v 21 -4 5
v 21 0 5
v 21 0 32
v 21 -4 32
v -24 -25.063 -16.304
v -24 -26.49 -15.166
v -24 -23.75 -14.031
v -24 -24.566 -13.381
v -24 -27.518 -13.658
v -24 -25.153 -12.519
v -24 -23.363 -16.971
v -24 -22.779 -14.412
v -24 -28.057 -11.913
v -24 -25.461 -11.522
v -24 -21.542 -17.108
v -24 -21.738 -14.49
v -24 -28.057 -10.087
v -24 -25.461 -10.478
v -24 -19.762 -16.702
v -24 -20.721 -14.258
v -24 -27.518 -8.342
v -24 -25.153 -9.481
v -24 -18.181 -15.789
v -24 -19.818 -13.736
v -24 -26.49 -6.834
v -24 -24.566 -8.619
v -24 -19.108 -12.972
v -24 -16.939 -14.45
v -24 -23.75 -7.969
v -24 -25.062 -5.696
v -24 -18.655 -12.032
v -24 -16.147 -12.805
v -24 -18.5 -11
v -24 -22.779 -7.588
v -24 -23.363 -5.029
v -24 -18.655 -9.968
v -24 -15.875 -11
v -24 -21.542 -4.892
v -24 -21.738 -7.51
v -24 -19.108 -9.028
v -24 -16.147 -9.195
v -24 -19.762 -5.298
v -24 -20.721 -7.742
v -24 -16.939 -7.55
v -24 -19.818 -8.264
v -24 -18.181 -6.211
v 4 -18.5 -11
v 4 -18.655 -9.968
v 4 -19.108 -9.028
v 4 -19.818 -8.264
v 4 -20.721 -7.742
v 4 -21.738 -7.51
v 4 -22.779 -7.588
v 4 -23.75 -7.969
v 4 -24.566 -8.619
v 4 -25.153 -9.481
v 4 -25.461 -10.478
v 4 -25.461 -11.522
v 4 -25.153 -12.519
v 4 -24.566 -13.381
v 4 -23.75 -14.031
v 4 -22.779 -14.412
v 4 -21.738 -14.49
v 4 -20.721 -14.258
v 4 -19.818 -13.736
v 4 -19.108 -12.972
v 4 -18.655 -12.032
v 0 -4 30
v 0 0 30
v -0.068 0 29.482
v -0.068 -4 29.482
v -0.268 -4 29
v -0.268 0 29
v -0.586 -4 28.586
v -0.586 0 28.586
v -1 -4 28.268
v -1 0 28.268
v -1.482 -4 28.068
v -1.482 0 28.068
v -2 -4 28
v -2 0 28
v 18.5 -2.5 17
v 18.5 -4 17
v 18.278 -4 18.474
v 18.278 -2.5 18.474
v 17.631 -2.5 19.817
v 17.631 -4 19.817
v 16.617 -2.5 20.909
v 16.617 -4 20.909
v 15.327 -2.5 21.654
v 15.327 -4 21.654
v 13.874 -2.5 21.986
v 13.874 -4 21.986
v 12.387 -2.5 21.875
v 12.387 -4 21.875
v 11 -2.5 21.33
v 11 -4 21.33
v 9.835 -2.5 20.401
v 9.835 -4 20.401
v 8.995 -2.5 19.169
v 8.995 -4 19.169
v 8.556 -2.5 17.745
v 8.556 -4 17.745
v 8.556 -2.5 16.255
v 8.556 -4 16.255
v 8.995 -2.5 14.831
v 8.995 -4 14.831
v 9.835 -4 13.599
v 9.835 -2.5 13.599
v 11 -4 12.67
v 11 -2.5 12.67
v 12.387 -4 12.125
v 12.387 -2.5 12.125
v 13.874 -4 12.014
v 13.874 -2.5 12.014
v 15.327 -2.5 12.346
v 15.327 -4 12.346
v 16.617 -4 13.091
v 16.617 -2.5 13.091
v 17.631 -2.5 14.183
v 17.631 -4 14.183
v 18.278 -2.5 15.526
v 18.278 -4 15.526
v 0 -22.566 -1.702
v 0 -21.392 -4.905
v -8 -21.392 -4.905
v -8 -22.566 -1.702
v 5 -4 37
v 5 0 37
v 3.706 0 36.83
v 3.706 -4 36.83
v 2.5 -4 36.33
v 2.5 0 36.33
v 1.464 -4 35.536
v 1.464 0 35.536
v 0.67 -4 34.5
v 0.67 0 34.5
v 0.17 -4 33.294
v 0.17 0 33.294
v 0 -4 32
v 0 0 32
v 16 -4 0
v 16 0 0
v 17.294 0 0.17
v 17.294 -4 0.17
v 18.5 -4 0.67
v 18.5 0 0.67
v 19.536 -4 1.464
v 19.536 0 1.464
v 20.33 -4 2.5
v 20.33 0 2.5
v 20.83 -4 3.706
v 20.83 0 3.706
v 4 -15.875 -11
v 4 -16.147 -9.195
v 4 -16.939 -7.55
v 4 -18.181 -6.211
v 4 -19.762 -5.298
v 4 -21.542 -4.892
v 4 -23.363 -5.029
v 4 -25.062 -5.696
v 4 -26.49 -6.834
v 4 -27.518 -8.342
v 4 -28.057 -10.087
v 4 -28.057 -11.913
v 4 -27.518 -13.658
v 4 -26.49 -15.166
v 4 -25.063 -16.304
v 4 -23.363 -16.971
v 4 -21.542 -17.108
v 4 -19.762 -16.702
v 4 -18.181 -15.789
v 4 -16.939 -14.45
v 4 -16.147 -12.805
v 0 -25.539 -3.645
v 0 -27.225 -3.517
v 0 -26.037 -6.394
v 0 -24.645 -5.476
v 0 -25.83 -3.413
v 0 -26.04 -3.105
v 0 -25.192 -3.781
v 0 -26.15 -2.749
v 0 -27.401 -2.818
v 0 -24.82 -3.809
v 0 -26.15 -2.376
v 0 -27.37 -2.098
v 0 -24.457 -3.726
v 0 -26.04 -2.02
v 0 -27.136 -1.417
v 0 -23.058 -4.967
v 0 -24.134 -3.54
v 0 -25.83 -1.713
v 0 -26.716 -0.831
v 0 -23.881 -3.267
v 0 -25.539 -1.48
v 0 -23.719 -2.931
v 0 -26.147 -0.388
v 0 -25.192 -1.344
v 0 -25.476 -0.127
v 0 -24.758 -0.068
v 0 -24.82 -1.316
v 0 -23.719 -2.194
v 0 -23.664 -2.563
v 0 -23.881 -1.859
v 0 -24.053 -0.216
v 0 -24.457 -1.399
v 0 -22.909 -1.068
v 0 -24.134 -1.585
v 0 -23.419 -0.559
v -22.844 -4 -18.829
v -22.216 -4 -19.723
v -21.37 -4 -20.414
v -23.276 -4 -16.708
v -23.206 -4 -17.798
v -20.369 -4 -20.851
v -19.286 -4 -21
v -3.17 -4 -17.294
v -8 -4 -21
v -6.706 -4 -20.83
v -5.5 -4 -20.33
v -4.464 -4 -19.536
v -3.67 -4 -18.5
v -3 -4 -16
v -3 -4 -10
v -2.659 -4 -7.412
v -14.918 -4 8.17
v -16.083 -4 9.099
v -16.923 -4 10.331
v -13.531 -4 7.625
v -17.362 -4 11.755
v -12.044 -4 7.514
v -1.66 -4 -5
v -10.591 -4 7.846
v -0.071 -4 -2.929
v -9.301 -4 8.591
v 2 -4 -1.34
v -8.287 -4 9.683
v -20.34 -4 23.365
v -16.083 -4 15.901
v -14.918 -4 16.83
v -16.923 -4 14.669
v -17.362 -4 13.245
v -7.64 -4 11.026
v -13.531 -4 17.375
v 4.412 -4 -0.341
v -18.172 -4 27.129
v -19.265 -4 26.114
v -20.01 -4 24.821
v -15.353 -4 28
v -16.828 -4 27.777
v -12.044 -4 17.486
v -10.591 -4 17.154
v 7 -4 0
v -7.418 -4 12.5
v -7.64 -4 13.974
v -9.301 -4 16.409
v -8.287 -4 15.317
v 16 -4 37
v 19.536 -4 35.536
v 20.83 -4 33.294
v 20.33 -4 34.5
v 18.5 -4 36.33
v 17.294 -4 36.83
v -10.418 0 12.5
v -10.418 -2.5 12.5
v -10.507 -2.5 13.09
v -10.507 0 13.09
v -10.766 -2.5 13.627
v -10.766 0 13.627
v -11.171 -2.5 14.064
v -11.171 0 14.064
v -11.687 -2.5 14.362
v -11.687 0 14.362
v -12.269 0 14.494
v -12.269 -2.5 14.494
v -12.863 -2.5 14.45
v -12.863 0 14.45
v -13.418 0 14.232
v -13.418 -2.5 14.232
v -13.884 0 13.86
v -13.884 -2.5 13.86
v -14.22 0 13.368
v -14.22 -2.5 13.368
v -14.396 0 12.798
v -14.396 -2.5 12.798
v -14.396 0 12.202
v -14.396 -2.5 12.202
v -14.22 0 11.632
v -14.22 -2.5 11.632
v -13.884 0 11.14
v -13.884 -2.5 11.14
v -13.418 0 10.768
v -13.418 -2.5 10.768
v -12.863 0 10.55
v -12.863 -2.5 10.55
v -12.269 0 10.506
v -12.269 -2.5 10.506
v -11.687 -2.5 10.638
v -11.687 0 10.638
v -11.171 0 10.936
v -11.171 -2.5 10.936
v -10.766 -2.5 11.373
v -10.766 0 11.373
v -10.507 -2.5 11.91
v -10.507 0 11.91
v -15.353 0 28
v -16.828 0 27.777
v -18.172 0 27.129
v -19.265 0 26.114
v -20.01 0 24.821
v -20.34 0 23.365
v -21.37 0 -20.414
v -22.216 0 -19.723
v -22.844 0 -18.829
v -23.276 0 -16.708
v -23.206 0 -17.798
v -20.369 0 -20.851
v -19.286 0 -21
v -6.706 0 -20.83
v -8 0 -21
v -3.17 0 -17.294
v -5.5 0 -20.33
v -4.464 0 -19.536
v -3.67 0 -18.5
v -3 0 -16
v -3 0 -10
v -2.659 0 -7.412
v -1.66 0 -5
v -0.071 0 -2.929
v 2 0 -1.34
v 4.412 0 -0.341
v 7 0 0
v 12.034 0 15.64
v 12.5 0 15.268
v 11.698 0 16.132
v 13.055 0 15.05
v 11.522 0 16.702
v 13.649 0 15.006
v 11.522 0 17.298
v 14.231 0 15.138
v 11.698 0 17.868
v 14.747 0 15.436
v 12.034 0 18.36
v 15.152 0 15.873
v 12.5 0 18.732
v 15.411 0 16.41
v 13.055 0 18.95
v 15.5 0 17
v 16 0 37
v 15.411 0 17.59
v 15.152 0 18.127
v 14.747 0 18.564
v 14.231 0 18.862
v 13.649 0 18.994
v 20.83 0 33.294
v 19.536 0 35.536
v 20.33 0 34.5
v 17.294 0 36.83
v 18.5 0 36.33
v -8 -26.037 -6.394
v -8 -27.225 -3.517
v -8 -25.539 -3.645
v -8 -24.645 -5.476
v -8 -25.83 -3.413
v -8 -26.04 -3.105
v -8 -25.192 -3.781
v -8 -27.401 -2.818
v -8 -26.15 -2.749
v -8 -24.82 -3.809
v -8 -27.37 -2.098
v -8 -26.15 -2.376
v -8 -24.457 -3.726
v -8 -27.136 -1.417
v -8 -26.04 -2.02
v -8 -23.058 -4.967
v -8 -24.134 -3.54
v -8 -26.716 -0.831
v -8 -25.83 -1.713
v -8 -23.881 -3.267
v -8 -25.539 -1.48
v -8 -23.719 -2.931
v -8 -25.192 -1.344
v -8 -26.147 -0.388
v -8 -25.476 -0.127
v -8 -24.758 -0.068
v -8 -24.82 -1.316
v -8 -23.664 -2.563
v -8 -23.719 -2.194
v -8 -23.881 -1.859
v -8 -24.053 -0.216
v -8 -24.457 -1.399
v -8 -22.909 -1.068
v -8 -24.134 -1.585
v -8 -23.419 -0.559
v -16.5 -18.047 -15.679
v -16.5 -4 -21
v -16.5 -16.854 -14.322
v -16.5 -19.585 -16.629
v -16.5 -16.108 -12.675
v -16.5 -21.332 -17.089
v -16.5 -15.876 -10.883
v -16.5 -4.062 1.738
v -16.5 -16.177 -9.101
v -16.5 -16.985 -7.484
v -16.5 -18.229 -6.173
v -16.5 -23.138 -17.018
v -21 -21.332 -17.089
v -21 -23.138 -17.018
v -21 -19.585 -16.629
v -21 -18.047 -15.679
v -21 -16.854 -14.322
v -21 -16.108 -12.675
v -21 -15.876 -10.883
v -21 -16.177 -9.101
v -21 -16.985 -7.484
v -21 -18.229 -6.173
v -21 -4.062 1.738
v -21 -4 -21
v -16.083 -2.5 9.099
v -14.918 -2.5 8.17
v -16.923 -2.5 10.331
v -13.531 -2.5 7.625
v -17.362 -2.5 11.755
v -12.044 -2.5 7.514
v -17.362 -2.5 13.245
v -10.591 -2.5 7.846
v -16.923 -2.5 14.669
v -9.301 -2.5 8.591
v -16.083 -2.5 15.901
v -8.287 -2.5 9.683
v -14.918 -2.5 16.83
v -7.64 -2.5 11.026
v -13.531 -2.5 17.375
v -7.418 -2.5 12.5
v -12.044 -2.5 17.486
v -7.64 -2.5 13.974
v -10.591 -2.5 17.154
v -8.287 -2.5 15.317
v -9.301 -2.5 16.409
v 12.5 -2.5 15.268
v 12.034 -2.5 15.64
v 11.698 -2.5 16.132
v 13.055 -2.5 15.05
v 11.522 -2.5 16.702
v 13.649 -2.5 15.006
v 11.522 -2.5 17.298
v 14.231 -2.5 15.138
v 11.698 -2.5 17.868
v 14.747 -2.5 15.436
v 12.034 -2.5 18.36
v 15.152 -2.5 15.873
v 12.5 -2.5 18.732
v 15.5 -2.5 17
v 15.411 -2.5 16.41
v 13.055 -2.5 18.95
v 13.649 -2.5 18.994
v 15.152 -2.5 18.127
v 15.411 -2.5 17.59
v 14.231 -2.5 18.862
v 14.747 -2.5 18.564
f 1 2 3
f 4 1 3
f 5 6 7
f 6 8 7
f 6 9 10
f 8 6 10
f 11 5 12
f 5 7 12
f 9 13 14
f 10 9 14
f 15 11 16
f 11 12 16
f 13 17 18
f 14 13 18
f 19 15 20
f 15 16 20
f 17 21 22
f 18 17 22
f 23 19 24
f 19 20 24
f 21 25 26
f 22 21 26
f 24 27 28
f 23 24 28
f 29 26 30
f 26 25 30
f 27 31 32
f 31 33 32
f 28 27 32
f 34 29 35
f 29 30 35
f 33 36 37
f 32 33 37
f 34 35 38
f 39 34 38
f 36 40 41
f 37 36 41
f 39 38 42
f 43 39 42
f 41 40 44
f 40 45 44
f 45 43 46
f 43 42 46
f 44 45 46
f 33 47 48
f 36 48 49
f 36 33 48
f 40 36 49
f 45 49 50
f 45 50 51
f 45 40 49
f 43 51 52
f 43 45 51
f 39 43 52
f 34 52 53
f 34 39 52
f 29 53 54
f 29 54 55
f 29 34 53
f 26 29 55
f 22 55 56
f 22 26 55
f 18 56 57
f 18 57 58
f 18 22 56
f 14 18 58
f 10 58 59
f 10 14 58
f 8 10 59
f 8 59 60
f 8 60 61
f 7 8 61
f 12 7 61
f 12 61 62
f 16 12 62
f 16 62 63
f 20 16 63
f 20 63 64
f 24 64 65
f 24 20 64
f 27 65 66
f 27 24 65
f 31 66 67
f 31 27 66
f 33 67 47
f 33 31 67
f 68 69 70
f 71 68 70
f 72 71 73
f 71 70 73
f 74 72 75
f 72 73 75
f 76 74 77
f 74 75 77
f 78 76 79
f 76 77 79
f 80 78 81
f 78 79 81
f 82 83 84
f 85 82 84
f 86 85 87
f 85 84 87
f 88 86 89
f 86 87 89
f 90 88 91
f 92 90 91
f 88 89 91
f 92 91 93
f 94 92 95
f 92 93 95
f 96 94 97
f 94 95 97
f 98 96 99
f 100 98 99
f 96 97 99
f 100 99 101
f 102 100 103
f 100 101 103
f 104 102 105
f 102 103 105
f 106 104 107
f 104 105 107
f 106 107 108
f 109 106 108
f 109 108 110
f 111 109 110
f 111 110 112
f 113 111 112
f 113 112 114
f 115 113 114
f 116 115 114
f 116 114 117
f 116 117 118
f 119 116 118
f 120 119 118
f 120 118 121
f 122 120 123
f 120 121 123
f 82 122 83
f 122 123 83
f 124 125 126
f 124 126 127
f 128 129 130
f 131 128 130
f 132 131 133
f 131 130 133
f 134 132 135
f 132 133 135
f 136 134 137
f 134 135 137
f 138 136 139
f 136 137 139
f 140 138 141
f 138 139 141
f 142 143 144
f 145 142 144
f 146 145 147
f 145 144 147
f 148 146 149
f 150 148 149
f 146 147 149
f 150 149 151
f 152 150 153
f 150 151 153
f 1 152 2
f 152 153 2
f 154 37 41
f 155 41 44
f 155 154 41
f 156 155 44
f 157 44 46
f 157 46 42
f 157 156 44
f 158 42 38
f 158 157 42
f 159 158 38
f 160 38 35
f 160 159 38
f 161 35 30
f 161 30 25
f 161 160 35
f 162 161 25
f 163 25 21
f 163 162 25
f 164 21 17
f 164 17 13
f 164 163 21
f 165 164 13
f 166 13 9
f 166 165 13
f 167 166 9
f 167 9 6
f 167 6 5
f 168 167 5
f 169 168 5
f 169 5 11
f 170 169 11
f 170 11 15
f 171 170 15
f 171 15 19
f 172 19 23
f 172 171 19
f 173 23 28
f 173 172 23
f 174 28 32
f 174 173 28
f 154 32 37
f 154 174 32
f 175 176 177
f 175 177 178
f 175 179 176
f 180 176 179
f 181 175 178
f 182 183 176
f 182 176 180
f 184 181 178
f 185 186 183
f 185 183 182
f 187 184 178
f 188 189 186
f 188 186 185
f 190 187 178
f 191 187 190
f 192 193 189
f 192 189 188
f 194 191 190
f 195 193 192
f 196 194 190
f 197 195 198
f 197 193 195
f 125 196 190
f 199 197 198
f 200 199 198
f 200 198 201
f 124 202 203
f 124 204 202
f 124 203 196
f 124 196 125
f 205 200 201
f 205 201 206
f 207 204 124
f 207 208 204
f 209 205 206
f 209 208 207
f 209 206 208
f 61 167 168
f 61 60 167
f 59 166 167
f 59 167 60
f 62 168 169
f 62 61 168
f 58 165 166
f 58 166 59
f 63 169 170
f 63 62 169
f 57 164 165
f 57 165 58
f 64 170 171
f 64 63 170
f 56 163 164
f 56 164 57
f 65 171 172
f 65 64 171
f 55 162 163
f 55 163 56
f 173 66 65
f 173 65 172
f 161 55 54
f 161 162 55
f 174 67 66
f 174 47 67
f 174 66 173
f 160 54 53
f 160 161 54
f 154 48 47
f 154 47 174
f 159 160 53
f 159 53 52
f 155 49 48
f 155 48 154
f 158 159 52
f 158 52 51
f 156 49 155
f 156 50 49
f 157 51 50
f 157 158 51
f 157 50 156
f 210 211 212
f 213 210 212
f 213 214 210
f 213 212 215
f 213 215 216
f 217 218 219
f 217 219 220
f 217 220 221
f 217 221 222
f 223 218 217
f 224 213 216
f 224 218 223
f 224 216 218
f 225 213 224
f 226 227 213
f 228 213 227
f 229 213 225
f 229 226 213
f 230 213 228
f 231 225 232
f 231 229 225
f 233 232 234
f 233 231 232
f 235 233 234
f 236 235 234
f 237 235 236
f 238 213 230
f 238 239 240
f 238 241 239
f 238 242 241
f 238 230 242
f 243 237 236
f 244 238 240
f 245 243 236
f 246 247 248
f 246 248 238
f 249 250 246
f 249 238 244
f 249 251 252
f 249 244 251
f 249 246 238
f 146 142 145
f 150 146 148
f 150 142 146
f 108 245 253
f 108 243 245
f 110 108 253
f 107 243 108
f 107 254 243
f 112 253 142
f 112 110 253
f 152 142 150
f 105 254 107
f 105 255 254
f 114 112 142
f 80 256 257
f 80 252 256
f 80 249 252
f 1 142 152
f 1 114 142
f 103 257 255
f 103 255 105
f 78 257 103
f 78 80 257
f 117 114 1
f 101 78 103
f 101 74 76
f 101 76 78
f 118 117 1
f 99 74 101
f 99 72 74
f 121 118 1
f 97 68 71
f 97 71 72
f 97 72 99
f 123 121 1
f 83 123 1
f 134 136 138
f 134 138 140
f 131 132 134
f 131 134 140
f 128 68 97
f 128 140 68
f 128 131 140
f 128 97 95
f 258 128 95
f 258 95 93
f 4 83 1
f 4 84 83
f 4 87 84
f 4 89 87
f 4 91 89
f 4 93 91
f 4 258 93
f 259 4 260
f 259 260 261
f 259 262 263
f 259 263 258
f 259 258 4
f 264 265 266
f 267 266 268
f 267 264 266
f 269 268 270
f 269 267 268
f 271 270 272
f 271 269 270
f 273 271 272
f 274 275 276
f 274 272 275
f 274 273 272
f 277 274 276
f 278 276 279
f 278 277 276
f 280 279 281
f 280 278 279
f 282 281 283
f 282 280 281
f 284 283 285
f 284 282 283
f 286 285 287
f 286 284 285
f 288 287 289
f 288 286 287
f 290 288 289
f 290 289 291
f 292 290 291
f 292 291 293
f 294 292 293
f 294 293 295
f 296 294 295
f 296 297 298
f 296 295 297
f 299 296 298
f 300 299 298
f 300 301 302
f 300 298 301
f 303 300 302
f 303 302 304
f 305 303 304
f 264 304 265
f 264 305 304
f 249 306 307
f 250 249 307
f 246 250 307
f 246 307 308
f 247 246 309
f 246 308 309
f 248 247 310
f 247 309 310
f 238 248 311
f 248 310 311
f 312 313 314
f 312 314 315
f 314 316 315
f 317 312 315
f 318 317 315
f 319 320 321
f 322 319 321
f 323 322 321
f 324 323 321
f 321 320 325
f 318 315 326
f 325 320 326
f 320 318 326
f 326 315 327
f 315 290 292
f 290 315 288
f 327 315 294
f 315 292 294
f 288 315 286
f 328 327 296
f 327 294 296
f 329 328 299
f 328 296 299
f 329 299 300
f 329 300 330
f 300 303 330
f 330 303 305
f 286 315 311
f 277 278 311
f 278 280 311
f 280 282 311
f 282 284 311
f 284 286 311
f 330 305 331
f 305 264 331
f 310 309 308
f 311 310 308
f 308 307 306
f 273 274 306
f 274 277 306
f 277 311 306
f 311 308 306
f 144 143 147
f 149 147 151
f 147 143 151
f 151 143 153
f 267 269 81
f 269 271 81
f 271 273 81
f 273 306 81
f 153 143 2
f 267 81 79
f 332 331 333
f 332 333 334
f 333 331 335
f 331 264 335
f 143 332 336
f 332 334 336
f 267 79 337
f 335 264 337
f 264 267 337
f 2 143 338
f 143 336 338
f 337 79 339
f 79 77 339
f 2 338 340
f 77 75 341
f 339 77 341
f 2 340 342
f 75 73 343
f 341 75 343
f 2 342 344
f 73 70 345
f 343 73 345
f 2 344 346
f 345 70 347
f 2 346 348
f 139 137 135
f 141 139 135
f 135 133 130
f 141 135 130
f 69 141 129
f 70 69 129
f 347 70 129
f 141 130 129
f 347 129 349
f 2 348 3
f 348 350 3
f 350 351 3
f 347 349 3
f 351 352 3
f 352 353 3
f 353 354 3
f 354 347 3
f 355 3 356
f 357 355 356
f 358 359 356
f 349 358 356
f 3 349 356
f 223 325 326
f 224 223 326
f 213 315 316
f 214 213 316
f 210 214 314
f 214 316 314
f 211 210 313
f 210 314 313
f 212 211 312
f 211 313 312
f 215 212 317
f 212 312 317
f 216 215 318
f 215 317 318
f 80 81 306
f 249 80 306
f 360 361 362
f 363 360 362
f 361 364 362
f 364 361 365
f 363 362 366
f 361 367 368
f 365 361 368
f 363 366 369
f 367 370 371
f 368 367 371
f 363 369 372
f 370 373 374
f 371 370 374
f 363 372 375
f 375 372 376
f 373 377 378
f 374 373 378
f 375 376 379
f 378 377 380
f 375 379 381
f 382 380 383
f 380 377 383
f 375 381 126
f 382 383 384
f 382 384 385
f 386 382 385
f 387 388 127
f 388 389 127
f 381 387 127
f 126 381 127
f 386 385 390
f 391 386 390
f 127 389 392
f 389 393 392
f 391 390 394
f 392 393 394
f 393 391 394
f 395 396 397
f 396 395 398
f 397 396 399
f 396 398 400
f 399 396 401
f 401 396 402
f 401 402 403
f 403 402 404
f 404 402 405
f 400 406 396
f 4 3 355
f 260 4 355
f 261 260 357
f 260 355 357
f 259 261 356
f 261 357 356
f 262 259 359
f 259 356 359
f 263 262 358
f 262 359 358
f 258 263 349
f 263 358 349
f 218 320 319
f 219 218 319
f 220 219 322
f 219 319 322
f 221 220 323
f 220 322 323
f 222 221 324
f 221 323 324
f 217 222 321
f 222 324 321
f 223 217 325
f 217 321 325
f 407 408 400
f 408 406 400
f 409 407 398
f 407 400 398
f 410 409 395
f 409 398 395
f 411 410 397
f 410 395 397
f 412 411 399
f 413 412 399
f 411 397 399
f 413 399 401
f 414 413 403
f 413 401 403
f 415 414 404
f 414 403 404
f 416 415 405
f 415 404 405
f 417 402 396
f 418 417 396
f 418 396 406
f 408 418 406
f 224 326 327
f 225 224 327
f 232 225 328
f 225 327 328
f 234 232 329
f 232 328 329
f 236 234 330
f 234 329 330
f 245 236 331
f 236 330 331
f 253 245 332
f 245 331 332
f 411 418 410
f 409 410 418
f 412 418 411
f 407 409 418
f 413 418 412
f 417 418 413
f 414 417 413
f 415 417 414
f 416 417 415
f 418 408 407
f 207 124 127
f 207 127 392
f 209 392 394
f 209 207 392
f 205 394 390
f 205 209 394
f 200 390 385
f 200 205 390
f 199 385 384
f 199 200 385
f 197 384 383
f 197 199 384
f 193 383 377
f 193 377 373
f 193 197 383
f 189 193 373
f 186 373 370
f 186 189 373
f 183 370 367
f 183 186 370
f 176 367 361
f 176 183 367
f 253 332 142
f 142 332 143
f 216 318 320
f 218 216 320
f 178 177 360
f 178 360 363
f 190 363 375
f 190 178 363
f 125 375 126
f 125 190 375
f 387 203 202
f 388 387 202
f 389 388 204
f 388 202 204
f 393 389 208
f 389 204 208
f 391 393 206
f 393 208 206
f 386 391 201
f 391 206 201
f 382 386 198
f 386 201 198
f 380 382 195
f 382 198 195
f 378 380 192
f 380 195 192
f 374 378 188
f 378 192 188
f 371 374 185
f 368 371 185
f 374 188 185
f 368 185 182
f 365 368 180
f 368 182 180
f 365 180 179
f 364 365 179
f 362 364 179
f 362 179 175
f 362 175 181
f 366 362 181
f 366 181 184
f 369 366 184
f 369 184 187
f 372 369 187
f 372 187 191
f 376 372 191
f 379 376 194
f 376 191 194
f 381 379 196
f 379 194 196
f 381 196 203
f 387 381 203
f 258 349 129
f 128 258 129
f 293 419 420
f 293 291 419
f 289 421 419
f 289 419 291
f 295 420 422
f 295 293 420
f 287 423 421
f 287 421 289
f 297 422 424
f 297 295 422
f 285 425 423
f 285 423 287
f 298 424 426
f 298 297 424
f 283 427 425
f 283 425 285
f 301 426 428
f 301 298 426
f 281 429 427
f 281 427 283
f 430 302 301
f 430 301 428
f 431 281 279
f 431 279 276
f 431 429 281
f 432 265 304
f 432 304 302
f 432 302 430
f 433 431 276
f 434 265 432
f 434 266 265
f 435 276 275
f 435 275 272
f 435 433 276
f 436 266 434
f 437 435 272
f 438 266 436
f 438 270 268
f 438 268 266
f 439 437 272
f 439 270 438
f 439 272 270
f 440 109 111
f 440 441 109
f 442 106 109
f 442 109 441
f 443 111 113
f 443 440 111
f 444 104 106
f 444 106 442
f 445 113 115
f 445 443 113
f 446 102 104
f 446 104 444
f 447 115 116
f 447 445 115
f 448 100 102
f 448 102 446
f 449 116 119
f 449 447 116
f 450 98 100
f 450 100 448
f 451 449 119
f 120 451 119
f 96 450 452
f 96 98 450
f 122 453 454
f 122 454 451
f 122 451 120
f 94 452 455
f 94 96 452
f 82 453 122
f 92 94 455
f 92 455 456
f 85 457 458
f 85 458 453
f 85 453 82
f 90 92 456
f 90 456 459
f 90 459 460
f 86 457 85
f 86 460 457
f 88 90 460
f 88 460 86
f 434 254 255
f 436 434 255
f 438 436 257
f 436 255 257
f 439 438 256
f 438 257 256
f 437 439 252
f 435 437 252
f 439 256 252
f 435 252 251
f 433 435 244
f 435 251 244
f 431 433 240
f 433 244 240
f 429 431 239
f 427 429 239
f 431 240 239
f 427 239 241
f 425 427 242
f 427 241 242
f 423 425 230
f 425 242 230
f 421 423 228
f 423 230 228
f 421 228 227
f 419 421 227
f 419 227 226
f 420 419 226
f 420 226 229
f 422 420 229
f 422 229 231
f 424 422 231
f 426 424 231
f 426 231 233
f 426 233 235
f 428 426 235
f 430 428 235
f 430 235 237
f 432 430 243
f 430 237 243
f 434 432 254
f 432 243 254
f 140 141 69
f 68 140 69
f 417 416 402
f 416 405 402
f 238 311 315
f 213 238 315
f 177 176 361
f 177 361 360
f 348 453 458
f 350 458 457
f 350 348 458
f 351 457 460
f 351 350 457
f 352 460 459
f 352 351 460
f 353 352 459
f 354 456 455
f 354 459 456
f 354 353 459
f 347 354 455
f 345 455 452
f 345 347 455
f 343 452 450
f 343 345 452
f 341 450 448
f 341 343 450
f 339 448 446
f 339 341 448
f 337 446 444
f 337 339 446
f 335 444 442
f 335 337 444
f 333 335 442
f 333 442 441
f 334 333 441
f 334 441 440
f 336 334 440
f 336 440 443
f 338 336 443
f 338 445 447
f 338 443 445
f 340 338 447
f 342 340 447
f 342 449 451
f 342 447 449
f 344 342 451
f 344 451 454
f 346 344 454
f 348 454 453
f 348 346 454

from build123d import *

# Parameters (mm, degrees)
F0_R           = 2
F1_DEPTH       = 4
F2_R           = 5
F3_DEPTH       = 1.5
F4_R           = 6.125
F4_R_2         = 3.5
F5_DEPTH       = 20
F6_R           = 1.25
F7_DEPTH       = 8
F8_DEPTH       = 4
F10_DEPTH      = 3.5
F10_DEPTH_BACK = 1
F11_DEPTH      = 4


with BuildPart() as f1:
    # F0 (on Front) → F1 (new body)
    with BuildSketch(Plane.XZ):
        with BuildLine():
            ThreePointArc((-3, -10), (-0.0710678119, -2.9289321881), (7, 0))
            Line((7, 0), (16, 0))
            ThreePointArc((16, 0), (19.5355339059, 1.4644660941), (21, 5))
            Line((21, 5), (21, 32))
            ThreePointArc((21, 32), (19.5355339059, 35.5355339059), (16, 37))
            Line((16, 37), (5, 37))
            ThreePointArc((5, 37), (1.4644660941, 35.5355339059), (0, 32))
            Line((0, 32), (0, 30))
            ThreePointArc((0, 30), (-0.5857864376, 28.5857864376), (-2, 28))
            Line((-2, 28), (-15.3529466806, 28))
            ThreePointArc((-15.3529466806, 28), (-18.7568523372, 26.6624344747), (-20.3395792507, 23.3653705126))
            Line((-20.3395792507, 23.3653705126), (-23.2757329417, -16.7077035899))
            ThreePointArc((-23.2757329417, -16.7077035899), (-22.2163744655, -19.7231245252), (-19.2864268857, -21))
            Line((-19.2864268857, -21), (-8, -21))
            ThreePointArc((-8, -21), (-4.4644660941, -19.5355339059), (-3, -16))
            Line((-3, -16), (-3, -10))
        make_face()
        with Locations((-12.4181403654, 12.5)):
            Circle(F0_R, mode=Mode.SUBTRACT)
        with Locations((13.5, 17)):
            Circle(F0_R, mode=Mode.SUBTRACT)
    extrude(amount=F1_DEPTH)

    # F2 (on face) → F3 (cut)
    with BuildSketch(Plane.XZ.offset(4)):
        with Locations((-12.4181403654, 12.5)):
            Circle(F2_R)
        with Locations((13.5, 17)):
            Circle(F2_R)
    extrude(amount=-F3_DEPTH, mode=Mode.SUBTRACT)


with BuildPart() as f5:
    # F4 (on Right) → F5 (new body)
    with BuildSketch(Plane.YZ):
        with Locations((-22, -11)):
            Circle(F4_R)
        with Locations((-22, -11)):
            Circle(F4_R_2, mode=Mode.SUBTRACT)
    extrude(amount=-F5_DEPTH)

    # F4 (on Right) → F8 (join)
    with BuildSketch(Plane.YZ):
        with Locations((-22, -11)):
            Circle(F4_R)
        with Locations((-22, -11)):
            Circle(F4_R_2, mode=Mode.SUBTRACT)
    extrude(amount=F8_DEPTH)

    # F11 (add): a face of the model
    f11_faces = [f5.faces().sort_by_distance(p)[0] for p in [
        (-20, -27.9517588386, -11),
    ]]
    extrude(f11_faces, amount=F11_DEPTH)


with BuildPart() as f7:
    # F6 (on face) → F7 (new body)
    with BuildSketch(Plane.YZ):
        with BuildLine():
            ThreePointArc((-27.2245328288, -3.5167956513), (-24.4274190035, -5.0149827659), (-22.4137369271, -2.56273994))
            ThreePointArc((-22.4137369271, -2.56273994), (-22.4522212571, -2.125772428), (-22.5664894122, -1.7022580377))
            ThreePointArc((-22.5664894122, -1.7022580377), (-25.8211887813, -0.2332483362), (-27.2245328288, -3.5167956513))
        make_face()
        with Locations((-24.9137369271, -2.56273994)):
            Circle(F6_R, mode=Mode.SUBTRACT)
        with BuildLine():
            ThreePointArc((-22.5664894122, -1.7022580377), (-22.4522212571, -2.125772428), (-22.4137369271, -2.56273994))
            ThreePointArc((-22.4137369271, -2.56273994), (-24.4274190035, -5.0149827659), (-27.2245328288, -3.5167956513))
            Line((-27.2245328288, -3.5167956513), (-26.0368237989, -6.3935177612))
            ThreePointArc((-26.0368237989, -6.3935177612), (-23.8690895414, -5.1671508432), (-21.3923093478, -4.9052205068))
            Line((-21.3923093478, -4.9052205068), (-22.5664894122, -1.7022580377))
        make_face()
    extrude(amount=-F7_DEPTH)


with BuildPart() as f10:
    # F9 (on face) → F10 (new body, two sides)
    with BuildSketch(Plane(origin=(-20, 0, 0), x_dir=(0, -1, 0), z_dir=(-1, 0, 0))) as f10_sk:
        with BuildLine():
            Line((4, -21), (23.1384048777, -17.0182771068))
            ThreePointArc((23.1384048777, -17.0182771068), (16.4200946717, -13.5259219163), (18.2291235039, -6.1733950388))
            Line((18.2291235039, -6.1733950388), (4.0624700915, 1.7376900148))
            Line((4.0624700915, 1.7376900148), (4, -21))
        make_face()
    extrude(amount=-F10_DEPTH)
    extrude(f10_sk.sketch, amount=F10_DEPTH_BACK)


with BuildPart() as f5_1:
    # F12: moved
    add(f5.part)


with BuildPart() as f7_1:
    # F12: moved
    add(f7.part)


with BuildPart() as f10_1:
    # F12: moved
    add(f10.part)


solid = Compound([f1.part, f5_1.part, f7_1.part, f10_1.part])
